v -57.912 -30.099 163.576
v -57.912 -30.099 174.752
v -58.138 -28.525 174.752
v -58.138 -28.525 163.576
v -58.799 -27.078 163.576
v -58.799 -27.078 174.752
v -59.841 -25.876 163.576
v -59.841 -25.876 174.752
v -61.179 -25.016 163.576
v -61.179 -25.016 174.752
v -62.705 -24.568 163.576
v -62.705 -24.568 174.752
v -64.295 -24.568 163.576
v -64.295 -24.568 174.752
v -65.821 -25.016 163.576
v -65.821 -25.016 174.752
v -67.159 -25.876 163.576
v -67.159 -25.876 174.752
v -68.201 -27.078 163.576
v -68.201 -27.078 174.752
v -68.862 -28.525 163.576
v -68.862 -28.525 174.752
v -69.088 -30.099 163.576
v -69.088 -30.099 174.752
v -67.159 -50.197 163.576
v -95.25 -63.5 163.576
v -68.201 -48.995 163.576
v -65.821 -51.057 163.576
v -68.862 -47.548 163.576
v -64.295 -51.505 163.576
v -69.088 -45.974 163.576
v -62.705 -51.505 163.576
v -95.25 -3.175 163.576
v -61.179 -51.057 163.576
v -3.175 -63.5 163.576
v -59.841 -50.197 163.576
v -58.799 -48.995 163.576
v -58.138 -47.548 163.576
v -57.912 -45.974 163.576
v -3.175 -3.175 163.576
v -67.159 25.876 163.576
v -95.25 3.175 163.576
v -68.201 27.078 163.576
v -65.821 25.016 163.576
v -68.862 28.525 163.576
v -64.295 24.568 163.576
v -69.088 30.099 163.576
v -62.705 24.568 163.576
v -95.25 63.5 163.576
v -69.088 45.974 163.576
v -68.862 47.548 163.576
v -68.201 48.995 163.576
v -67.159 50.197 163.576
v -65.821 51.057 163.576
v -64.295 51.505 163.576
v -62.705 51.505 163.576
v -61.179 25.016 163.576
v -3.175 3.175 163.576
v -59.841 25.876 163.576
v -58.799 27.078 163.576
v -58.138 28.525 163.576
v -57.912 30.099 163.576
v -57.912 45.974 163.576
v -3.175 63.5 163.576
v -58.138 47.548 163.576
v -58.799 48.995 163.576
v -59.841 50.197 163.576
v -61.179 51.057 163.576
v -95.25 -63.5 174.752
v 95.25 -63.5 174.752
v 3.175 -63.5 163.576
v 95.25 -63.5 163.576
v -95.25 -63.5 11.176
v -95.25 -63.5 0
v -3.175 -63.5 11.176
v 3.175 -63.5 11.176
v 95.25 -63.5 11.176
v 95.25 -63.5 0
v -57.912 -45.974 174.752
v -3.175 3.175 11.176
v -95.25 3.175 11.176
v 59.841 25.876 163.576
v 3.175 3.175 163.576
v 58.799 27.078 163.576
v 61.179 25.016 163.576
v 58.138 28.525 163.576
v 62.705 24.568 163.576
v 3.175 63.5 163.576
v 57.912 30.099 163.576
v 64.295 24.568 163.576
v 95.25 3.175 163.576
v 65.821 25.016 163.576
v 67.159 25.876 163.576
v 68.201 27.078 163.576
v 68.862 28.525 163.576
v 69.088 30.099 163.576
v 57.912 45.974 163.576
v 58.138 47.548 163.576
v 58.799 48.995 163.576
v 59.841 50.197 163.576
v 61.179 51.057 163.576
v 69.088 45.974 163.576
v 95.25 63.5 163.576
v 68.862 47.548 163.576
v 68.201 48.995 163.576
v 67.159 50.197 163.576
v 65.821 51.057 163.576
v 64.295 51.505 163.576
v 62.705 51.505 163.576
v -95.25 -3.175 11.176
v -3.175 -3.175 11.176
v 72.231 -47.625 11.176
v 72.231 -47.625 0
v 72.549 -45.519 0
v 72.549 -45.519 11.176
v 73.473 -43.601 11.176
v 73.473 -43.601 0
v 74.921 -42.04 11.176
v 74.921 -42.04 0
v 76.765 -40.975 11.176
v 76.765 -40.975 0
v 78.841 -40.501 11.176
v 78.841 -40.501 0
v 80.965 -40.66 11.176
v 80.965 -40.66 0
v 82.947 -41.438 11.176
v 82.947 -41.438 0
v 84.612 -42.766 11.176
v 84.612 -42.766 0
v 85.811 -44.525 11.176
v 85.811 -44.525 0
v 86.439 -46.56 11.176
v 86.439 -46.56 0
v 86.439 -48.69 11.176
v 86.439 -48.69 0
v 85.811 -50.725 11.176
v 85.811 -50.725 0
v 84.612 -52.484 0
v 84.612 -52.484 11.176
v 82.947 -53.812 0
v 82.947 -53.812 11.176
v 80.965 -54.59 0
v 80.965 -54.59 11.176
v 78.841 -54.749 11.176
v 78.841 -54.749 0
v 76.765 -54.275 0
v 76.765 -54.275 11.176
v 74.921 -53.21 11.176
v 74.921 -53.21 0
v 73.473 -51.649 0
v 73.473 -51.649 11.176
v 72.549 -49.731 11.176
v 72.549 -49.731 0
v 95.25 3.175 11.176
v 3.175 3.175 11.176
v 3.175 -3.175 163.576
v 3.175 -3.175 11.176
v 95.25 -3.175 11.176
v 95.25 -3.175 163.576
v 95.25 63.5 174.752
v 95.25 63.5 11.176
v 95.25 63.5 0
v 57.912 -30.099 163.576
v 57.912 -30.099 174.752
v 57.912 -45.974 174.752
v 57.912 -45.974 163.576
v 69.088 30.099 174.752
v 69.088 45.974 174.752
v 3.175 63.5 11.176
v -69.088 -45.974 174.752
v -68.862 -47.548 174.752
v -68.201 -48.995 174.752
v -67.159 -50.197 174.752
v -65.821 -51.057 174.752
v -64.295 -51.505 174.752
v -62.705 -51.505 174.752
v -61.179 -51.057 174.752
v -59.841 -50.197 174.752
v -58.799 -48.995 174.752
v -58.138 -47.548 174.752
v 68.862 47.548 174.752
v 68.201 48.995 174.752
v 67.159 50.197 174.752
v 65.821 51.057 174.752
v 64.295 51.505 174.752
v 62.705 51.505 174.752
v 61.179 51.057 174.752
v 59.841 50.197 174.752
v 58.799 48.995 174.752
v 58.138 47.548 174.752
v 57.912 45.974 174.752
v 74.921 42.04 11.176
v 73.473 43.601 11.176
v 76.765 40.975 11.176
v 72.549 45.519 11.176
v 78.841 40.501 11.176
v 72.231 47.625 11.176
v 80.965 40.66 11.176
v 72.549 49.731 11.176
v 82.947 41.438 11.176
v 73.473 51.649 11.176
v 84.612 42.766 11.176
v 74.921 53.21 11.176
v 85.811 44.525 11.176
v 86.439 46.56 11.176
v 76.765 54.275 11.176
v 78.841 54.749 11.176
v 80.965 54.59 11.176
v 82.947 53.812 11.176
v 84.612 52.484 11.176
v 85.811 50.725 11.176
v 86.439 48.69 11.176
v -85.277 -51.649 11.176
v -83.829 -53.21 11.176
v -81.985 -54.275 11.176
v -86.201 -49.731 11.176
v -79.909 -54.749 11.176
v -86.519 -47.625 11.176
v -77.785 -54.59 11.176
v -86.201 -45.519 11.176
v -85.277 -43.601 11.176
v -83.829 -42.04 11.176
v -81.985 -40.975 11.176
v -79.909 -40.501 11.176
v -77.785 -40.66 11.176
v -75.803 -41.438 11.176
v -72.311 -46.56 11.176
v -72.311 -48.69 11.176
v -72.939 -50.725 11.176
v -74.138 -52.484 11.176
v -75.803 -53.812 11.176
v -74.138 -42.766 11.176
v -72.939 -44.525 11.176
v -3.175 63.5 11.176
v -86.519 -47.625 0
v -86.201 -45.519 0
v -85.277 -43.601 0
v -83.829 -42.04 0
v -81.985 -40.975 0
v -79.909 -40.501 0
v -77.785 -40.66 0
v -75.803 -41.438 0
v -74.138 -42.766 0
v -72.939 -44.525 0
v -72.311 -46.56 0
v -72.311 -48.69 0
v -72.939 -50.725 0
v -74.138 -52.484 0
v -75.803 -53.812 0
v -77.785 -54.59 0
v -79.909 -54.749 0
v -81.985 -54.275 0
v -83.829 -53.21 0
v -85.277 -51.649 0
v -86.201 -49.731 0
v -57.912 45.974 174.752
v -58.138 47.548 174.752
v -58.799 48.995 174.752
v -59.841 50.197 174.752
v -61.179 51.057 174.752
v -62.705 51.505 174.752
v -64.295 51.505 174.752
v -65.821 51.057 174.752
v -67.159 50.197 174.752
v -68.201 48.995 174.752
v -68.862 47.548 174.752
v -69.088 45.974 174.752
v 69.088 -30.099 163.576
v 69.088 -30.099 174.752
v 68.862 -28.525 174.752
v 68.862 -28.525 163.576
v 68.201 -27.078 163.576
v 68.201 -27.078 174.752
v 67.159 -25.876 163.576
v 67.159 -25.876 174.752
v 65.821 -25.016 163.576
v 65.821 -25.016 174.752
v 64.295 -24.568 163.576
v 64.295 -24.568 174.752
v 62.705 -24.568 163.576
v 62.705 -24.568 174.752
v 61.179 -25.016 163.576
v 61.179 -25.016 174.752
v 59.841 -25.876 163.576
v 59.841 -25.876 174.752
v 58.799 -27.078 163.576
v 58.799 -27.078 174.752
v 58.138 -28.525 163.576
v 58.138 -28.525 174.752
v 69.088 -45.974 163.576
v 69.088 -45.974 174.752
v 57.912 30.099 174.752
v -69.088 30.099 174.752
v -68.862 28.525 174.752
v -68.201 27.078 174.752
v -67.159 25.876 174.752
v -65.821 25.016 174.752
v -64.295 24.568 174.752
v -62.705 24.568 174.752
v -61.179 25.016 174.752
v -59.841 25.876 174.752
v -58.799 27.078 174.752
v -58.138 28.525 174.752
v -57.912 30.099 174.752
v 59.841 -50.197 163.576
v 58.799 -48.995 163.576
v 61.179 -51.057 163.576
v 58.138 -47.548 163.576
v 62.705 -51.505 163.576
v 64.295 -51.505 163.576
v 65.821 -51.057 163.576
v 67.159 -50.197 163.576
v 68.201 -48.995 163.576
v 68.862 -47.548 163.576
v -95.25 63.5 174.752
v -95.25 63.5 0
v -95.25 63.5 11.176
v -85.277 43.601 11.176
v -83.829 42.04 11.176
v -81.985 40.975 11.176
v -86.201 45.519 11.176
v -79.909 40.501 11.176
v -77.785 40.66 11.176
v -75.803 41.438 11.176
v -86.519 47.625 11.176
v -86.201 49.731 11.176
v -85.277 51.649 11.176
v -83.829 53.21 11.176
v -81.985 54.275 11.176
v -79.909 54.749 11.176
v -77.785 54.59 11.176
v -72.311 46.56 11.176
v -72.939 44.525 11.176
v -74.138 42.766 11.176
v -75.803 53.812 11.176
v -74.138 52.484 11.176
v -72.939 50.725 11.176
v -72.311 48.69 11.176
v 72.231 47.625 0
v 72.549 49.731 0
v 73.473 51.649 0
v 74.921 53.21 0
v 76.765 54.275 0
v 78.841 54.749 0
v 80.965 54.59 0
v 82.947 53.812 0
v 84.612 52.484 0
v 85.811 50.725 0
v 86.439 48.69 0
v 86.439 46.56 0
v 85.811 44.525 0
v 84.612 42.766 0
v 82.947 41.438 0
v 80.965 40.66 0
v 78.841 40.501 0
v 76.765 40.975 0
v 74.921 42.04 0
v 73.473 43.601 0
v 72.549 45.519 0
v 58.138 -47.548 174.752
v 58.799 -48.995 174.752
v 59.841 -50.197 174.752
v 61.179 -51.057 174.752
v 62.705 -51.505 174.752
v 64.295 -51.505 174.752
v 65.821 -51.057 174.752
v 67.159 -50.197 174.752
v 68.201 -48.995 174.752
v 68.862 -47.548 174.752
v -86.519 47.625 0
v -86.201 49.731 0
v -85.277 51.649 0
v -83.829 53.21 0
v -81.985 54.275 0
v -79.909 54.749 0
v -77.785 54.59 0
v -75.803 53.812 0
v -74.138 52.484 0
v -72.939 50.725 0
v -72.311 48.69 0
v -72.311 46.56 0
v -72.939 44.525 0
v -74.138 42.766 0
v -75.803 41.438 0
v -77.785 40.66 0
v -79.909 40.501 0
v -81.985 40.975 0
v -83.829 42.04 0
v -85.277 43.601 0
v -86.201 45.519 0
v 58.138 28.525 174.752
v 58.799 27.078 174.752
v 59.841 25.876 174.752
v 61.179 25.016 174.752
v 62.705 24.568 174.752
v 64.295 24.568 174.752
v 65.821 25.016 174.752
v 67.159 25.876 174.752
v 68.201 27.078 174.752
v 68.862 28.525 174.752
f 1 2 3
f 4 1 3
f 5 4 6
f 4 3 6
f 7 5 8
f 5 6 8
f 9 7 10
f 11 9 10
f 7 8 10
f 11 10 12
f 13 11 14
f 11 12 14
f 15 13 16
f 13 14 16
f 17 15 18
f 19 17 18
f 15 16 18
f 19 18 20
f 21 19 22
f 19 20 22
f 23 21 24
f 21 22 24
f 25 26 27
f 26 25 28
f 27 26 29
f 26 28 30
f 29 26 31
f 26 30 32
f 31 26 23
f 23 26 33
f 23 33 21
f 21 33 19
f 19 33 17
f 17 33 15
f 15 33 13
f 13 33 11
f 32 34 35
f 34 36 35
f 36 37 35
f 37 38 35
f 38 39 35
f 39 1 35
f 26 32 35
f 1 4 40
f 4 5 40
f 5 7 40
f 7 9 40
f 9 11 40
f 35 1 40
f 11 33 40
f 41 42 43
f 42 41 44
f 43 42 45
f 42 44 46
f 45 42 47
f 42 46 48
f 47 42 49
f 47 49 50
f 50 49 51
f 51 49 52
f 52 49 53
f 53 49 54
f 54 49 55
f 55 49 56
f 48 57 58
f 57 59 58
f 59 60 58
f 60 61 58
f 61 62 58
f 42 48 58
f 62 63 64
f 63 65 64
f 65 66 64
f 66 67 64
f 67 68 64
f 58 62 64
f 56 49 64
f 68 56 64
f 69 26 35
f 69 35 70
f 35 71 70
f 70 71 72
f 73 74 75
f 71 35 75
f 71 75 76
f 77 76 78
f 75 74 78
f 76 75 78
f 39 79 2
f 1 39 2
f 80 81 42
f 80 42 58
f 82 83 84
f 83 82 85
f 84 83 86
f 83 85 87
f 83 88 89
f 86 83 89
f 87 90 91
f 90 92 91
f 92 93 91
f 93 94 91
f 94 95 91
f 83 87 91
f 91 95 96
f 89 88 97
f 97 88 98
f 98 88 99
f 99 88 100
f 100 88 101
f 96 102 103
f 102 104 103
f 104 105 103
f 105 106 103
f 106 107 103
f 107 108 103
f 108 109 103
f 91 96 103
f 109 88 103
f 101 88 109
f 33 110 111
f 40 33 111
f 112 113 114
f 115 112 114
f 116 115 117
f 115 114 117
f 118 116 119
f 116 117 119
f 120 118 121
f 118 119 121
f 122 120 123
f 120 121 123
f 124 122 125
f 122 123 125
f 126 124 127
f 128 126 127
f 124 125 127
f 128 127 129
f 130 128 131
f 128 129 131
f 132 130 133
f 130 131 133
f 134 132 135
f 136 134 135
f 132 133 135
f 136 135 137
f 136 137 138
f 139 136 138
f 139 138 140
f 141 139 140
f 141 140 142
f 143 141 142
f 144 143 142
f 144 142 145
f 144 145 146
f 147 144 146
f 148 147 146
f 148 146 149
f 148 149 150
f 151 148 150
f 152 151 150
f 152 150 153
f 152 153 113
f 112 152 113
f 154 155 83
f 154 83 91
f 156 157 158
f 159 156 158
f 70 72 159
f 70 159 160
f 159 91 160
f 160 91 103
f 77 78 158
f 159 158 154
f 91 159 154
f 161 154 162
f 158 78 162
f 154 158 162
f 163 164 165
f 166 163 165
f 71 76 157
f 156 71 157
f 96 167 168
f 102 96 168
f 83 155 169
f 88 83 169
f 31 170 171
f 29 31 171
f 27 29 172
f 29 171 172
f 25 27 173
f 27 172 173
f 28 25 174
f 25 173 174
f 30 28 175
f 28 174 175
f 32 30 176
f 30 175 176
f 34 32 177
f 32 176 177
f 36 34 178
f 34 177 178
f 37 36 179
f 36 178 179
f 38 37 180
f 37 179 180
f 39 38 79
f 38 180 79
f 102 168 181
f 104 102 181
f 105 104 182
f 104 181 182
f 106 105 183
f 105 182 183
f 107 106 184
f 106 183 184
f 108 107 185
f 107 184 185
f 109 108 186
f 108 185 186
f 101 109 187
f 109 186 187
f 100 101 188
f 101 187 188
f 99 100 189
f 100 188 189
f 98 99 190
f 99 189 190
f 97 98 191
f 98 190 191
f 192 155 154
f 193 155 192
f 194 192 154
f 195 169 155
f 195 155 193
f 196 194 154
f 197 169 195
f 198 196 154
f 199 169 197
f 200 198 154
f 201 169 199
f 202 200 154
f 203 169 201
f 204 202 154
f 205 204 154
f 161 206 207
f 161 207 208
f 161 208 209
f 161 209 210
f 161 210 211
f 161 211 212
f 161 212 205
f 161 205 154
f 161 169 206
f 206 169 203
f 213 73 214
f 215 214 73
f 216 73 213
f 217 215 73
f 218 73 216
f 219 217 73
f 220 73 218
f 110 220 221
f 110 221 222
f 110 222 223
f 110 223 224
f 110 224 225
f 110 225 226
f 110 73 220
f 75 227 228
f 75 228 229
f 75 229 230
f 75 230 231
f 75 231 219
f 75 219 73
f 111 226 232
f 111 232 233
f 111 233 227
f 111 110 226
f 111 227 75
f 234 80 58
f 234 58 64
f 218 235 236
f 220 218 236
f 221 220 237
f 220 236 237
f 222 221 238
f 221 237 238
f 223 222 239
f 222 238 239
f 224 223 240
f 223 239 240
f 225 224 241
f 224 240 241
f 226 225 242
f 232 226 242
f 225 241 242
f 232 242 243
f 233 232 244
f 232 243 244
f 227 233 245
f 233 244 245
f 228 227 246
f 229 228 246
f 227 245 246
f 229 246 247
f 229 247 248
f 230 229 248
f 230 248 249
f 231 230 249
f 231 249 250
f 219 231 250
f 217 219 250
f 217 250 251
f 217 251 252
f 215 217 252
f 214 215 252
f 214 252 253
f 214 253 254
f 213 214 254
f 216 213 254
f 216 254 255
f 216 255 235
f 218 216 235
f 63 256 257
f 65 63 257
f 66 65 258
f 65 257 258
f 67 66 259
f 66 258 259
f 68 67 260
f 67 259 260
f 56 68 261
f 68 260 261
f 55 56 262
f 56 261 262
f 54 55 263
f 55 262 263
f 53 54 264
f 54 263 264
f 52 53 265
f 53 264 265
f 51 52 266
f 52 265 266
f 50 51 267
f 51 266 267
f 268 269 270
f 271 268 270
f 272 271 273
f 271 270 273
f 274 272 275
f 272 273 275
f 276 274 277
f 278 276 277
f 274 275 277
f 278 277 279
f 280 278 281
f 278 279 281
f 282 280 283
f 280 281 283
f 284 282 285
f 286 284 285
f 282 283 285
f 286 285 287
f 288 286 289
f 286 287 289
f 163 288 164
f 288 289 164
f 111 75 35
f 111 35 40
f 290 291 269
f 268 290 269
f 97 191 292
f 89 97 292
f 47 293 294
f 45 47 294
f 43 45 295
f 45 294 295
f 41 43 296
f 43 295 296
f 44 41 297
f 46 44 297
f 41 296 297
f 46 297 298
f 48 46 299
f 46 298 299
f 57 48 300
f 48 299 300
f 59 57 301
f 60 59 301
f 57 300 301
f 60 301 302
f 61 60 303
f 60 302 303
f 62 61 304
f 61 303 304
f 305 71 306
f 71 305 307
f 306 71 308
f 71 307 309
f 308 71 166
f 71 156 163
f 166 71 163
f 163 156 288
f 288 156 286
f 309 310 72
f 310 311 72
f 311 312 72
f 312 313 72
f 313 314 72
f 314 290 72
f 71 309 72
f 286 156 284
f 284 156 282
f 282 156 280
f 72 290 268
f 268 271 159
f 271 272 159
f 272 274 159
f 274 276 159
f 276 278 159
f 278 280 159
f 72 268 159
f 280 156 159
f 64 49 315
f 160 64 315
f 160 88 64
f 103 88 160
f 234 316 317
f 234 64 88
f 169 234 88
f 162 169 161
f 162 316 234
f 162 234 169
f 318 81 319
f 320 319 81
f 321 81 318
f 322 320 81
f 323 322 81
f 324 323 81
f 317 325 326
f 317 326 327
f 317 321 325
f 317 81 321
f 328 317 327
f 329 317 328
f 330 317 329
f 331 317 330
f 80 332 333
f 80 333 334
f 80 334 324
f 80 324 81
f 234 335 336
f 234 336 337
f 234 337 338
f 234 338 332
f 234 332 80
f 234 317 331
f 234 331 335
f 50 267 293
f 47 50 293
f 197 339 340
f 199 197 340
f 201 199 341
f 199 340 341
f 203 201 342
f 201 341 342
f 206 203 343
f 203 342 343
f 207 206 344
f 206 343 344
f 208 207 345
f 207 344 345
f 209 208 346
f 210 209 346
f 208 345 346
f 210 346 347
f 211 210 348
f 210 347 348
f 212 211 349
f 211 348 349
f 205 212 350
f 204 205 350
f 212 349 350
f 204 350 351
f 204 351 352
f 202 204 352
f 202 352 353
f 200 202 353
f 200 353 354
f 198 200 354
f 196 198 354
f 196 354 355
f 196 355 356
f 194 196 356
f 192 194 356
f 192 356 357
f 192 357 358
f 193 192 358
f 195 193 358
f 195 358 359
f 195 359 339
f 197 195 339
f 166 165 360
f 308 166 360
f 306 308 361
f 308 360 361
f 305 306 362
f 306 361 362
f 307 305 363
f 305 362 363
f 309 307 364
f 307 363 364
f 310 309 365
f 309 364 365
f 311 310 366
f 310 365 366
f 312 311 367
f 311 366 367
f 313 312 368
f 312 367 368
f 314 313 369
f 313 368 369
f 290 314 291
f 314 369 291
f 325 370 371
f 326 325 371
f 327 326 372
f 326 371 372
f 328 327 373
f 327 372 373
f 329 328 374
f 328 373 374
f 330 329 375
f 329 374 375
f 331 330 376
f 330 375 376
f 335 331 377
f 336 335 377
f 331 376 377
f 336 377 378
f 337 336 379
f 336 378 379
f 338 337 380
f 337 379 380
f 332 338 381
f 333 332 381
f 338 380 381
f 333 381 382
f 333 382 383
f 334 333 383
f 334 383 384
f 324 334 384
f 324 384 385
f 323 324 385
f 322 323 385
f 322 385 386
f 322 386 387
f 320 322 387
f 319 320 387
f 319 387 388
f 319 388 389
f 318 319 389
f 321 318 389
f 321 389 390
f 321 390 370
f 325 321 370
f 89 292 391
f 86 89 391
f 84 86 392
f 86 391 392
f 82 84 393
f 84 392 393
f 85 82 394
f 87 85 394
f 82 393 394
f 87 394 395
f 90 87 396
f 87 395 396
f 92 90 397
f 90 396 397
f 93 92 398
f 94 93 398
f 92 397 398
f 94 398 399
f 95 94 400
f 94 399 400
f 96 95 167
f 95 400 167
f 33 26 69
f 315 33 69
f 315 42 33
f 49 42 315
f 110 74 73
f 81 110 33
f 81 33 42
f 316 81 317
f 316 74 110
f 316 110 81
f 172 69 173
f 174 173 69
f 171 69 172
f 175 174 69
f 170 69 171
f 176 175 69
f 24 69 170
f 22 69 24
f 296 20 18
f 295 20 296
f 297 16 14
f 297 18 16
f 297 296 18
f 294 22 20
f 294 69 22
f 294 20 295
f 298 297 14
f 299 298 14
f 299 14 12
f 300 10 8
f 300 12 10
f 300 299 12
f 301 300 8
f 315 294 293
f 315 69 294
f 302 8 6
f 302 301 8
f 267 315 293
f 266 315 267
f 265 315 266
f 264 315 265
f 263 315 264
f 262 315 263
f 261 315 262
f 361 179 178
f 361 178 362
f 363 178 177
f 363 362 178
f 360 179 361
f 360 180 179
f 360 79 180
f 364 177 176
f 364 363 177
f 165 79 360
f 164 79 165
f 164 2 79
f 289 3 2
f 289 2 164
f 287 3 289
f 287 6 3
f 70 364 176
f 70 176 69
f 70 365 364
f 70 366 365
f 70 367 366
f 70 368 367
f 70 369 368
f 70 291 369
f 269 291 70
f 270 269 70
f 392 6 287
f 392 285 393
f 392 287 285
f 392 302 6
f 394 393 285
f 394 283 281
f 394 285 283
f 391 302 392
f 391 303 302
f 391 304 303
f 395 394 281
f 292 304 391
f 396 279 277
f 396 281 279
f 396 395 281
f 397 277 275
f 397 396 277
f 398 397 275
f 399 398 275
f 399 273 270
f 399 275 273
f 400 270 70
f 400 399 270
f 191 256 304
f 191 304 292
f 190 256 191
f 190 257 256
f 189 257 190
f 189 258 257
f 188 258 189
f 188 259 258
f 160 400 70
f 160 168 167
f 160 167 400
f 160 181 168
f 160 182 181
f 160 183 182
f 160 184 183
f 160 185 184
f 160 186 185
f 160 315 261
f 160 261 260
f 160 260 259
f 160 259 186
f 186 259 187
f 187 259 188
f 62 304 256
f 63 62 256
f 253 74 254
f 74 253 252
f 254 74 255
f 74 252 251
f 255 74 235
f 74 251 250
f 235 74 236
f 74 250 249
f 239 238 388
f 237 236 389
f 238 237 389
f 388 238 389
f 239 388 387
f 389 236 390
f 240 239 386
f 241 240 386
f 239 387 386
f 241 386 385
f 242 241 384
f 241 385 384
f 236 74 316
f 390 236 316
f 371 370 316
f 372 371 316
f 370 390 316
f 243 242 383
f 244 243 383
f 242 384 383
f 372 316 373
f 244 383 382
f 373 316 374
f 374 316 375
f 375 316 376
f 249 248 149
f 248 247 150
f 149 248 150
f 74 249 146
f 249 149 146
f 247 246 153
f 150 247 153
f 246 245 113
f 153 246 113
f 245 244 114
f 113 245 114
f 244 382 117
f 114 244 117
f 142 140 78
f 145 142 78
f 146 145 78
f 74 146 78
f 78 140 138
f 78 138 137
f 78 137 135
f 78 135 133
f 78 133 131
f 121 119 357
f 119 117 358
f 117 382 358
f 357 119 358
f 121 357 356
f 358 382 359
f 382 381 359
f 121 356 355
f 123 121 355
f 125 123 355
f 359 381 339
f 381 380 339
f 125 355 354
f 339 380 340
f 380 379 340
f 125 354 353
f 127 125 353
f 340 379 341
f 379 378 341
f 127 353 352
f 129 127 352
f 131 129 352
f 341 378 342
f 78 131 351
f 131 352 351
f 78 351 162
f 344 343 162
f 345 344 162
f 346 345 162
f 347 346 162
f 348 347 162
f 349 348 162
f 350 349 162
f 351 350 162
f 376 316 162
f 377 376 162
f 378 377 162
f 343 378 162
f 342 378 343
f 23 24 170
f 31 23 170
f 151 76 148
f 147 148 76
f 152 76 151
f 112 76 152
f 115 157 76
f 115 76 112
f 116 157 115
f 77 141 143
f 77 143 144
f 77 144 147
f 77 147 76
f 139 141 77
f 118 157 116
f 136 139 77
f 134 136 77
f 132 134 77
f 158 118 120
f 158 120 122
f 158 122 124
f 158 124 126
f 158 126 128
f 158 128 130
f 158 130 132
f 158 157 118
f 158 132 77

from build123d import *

# Parameters (mm, degrees)
F0_W     = 190.5
F0_H     = 127
F1_DEPTH = 11.176
F3_D     = 14.2875
F4_W     = 92.075
F4_H     = 6.35
F4_W_2   = 6.35
F4_H_2   = 60.325
F5_DEPTH = 152.4
F6_W     = 190.5
F6_H     = 127
F7_DEPTH = 11.176
F9_DEPTH = 25.4


# Not quite as in the source:
# - a length typed as a fraction of an inch, garbled in the dataset ("3 / 203.2 mm" for 3/8 in), is restored


with BuildPart() as f1:
    # F0 (on Top) → F1 (new body)
    with BuildSketch(Plane.XY):
        Rectangle(F0_W, F0_H)
    extrude(amount=F1_DEPTH)

    # F3 (through all)
    with Locations(Plane.XY.offset(11.176)):
        with Locations((-79.375, 47.625), (79.375, 47.625), (-79.375, -47.625), (79.375, -47.625)):
            Hole(F3_D / 2)

    # F4 (on face) → F5 (join)
    with BuildSketch(Plane.XY.offset(11.176)):
        with Locations((-49.2125, 0)):
            Rectangle(F4_W, F4_H)
        with Locations((0, 33.3375)):
            Rectangle(F4_W_2, F4_H_2)
        Rectangle(F4_W_2, F4_H)
        with Locations((49.2125, 0)):
            Rectangle(F4_W, F4_H)
        with Locations((0, -33.3375)):
            Rectangle(F4_W_2, F4_H_2)
    extrude(amount=F5_DEPTH)

    # F6 (on face) → F7 (join)
    with BuildSketch(Plane.XY.offset(163.576)):
        Rectangle(F6_W, F6_H)
    extrude(amount=F7_DEPTH)

    # F8 (on face) → F9 (cut)
    with BuildSketch(Plane.XY.offset(174.752)):
        with BuildLine():
            ThreePointArc((-69.088, -45.974), (-63.5, -51.562), (-57.912, -45.974))
            Line((-57.912, -45.974), (-57.912, -30.099))
            ThreePointArc((-57.912, -30.099), (-63.5, -24.511), (-69.088, -30.099))
            Line((-69.088, -30.099), (-69.088, -45.974))
        make_face()
        with BuildLine():
            Line((-57.912, 30.099), (-57.912, 45.974))
            ThreePointArc((-57.912, 45.974), (-63.5, 51.562), (-69.088, 45.974))
            Line((-69.088, 45.974), (-69.088, 30.099))
            ThreePointArc((-69.088, 30.099), (-63.5, 24.511), (-57.912, 30.099))
        make_face()
        with BuildLine():
            Line((69.088, 30.099), (69.088, 45.974))
            ThreePointArc((69.088, 45.974), (63.5, 51.562), (57.912, 45.974))
            Line((57.912, 45.974), (57.912, 30.099))
            ThreePointArc((57.912, 30.099), (63.5, 24.511), (69.088, 30.099))
        make_face()
        with BuildLine():
            Line((57.912, -30.099), (57.912, -45.974))
            ThreePointArc((57.912, -45.974), (63.5, -51.562), (69.088, -45.974))
            Line((69.088, -45.974), (69.088, -30.099))
            ThreePointArc((69.088, -30.099), (63.5, -24.511), (57.912, -30.099))
        make_face()
    extrude(amount=-F9_DEPTH, mode=Mode.SUBTRACT)


solid = f1.part
